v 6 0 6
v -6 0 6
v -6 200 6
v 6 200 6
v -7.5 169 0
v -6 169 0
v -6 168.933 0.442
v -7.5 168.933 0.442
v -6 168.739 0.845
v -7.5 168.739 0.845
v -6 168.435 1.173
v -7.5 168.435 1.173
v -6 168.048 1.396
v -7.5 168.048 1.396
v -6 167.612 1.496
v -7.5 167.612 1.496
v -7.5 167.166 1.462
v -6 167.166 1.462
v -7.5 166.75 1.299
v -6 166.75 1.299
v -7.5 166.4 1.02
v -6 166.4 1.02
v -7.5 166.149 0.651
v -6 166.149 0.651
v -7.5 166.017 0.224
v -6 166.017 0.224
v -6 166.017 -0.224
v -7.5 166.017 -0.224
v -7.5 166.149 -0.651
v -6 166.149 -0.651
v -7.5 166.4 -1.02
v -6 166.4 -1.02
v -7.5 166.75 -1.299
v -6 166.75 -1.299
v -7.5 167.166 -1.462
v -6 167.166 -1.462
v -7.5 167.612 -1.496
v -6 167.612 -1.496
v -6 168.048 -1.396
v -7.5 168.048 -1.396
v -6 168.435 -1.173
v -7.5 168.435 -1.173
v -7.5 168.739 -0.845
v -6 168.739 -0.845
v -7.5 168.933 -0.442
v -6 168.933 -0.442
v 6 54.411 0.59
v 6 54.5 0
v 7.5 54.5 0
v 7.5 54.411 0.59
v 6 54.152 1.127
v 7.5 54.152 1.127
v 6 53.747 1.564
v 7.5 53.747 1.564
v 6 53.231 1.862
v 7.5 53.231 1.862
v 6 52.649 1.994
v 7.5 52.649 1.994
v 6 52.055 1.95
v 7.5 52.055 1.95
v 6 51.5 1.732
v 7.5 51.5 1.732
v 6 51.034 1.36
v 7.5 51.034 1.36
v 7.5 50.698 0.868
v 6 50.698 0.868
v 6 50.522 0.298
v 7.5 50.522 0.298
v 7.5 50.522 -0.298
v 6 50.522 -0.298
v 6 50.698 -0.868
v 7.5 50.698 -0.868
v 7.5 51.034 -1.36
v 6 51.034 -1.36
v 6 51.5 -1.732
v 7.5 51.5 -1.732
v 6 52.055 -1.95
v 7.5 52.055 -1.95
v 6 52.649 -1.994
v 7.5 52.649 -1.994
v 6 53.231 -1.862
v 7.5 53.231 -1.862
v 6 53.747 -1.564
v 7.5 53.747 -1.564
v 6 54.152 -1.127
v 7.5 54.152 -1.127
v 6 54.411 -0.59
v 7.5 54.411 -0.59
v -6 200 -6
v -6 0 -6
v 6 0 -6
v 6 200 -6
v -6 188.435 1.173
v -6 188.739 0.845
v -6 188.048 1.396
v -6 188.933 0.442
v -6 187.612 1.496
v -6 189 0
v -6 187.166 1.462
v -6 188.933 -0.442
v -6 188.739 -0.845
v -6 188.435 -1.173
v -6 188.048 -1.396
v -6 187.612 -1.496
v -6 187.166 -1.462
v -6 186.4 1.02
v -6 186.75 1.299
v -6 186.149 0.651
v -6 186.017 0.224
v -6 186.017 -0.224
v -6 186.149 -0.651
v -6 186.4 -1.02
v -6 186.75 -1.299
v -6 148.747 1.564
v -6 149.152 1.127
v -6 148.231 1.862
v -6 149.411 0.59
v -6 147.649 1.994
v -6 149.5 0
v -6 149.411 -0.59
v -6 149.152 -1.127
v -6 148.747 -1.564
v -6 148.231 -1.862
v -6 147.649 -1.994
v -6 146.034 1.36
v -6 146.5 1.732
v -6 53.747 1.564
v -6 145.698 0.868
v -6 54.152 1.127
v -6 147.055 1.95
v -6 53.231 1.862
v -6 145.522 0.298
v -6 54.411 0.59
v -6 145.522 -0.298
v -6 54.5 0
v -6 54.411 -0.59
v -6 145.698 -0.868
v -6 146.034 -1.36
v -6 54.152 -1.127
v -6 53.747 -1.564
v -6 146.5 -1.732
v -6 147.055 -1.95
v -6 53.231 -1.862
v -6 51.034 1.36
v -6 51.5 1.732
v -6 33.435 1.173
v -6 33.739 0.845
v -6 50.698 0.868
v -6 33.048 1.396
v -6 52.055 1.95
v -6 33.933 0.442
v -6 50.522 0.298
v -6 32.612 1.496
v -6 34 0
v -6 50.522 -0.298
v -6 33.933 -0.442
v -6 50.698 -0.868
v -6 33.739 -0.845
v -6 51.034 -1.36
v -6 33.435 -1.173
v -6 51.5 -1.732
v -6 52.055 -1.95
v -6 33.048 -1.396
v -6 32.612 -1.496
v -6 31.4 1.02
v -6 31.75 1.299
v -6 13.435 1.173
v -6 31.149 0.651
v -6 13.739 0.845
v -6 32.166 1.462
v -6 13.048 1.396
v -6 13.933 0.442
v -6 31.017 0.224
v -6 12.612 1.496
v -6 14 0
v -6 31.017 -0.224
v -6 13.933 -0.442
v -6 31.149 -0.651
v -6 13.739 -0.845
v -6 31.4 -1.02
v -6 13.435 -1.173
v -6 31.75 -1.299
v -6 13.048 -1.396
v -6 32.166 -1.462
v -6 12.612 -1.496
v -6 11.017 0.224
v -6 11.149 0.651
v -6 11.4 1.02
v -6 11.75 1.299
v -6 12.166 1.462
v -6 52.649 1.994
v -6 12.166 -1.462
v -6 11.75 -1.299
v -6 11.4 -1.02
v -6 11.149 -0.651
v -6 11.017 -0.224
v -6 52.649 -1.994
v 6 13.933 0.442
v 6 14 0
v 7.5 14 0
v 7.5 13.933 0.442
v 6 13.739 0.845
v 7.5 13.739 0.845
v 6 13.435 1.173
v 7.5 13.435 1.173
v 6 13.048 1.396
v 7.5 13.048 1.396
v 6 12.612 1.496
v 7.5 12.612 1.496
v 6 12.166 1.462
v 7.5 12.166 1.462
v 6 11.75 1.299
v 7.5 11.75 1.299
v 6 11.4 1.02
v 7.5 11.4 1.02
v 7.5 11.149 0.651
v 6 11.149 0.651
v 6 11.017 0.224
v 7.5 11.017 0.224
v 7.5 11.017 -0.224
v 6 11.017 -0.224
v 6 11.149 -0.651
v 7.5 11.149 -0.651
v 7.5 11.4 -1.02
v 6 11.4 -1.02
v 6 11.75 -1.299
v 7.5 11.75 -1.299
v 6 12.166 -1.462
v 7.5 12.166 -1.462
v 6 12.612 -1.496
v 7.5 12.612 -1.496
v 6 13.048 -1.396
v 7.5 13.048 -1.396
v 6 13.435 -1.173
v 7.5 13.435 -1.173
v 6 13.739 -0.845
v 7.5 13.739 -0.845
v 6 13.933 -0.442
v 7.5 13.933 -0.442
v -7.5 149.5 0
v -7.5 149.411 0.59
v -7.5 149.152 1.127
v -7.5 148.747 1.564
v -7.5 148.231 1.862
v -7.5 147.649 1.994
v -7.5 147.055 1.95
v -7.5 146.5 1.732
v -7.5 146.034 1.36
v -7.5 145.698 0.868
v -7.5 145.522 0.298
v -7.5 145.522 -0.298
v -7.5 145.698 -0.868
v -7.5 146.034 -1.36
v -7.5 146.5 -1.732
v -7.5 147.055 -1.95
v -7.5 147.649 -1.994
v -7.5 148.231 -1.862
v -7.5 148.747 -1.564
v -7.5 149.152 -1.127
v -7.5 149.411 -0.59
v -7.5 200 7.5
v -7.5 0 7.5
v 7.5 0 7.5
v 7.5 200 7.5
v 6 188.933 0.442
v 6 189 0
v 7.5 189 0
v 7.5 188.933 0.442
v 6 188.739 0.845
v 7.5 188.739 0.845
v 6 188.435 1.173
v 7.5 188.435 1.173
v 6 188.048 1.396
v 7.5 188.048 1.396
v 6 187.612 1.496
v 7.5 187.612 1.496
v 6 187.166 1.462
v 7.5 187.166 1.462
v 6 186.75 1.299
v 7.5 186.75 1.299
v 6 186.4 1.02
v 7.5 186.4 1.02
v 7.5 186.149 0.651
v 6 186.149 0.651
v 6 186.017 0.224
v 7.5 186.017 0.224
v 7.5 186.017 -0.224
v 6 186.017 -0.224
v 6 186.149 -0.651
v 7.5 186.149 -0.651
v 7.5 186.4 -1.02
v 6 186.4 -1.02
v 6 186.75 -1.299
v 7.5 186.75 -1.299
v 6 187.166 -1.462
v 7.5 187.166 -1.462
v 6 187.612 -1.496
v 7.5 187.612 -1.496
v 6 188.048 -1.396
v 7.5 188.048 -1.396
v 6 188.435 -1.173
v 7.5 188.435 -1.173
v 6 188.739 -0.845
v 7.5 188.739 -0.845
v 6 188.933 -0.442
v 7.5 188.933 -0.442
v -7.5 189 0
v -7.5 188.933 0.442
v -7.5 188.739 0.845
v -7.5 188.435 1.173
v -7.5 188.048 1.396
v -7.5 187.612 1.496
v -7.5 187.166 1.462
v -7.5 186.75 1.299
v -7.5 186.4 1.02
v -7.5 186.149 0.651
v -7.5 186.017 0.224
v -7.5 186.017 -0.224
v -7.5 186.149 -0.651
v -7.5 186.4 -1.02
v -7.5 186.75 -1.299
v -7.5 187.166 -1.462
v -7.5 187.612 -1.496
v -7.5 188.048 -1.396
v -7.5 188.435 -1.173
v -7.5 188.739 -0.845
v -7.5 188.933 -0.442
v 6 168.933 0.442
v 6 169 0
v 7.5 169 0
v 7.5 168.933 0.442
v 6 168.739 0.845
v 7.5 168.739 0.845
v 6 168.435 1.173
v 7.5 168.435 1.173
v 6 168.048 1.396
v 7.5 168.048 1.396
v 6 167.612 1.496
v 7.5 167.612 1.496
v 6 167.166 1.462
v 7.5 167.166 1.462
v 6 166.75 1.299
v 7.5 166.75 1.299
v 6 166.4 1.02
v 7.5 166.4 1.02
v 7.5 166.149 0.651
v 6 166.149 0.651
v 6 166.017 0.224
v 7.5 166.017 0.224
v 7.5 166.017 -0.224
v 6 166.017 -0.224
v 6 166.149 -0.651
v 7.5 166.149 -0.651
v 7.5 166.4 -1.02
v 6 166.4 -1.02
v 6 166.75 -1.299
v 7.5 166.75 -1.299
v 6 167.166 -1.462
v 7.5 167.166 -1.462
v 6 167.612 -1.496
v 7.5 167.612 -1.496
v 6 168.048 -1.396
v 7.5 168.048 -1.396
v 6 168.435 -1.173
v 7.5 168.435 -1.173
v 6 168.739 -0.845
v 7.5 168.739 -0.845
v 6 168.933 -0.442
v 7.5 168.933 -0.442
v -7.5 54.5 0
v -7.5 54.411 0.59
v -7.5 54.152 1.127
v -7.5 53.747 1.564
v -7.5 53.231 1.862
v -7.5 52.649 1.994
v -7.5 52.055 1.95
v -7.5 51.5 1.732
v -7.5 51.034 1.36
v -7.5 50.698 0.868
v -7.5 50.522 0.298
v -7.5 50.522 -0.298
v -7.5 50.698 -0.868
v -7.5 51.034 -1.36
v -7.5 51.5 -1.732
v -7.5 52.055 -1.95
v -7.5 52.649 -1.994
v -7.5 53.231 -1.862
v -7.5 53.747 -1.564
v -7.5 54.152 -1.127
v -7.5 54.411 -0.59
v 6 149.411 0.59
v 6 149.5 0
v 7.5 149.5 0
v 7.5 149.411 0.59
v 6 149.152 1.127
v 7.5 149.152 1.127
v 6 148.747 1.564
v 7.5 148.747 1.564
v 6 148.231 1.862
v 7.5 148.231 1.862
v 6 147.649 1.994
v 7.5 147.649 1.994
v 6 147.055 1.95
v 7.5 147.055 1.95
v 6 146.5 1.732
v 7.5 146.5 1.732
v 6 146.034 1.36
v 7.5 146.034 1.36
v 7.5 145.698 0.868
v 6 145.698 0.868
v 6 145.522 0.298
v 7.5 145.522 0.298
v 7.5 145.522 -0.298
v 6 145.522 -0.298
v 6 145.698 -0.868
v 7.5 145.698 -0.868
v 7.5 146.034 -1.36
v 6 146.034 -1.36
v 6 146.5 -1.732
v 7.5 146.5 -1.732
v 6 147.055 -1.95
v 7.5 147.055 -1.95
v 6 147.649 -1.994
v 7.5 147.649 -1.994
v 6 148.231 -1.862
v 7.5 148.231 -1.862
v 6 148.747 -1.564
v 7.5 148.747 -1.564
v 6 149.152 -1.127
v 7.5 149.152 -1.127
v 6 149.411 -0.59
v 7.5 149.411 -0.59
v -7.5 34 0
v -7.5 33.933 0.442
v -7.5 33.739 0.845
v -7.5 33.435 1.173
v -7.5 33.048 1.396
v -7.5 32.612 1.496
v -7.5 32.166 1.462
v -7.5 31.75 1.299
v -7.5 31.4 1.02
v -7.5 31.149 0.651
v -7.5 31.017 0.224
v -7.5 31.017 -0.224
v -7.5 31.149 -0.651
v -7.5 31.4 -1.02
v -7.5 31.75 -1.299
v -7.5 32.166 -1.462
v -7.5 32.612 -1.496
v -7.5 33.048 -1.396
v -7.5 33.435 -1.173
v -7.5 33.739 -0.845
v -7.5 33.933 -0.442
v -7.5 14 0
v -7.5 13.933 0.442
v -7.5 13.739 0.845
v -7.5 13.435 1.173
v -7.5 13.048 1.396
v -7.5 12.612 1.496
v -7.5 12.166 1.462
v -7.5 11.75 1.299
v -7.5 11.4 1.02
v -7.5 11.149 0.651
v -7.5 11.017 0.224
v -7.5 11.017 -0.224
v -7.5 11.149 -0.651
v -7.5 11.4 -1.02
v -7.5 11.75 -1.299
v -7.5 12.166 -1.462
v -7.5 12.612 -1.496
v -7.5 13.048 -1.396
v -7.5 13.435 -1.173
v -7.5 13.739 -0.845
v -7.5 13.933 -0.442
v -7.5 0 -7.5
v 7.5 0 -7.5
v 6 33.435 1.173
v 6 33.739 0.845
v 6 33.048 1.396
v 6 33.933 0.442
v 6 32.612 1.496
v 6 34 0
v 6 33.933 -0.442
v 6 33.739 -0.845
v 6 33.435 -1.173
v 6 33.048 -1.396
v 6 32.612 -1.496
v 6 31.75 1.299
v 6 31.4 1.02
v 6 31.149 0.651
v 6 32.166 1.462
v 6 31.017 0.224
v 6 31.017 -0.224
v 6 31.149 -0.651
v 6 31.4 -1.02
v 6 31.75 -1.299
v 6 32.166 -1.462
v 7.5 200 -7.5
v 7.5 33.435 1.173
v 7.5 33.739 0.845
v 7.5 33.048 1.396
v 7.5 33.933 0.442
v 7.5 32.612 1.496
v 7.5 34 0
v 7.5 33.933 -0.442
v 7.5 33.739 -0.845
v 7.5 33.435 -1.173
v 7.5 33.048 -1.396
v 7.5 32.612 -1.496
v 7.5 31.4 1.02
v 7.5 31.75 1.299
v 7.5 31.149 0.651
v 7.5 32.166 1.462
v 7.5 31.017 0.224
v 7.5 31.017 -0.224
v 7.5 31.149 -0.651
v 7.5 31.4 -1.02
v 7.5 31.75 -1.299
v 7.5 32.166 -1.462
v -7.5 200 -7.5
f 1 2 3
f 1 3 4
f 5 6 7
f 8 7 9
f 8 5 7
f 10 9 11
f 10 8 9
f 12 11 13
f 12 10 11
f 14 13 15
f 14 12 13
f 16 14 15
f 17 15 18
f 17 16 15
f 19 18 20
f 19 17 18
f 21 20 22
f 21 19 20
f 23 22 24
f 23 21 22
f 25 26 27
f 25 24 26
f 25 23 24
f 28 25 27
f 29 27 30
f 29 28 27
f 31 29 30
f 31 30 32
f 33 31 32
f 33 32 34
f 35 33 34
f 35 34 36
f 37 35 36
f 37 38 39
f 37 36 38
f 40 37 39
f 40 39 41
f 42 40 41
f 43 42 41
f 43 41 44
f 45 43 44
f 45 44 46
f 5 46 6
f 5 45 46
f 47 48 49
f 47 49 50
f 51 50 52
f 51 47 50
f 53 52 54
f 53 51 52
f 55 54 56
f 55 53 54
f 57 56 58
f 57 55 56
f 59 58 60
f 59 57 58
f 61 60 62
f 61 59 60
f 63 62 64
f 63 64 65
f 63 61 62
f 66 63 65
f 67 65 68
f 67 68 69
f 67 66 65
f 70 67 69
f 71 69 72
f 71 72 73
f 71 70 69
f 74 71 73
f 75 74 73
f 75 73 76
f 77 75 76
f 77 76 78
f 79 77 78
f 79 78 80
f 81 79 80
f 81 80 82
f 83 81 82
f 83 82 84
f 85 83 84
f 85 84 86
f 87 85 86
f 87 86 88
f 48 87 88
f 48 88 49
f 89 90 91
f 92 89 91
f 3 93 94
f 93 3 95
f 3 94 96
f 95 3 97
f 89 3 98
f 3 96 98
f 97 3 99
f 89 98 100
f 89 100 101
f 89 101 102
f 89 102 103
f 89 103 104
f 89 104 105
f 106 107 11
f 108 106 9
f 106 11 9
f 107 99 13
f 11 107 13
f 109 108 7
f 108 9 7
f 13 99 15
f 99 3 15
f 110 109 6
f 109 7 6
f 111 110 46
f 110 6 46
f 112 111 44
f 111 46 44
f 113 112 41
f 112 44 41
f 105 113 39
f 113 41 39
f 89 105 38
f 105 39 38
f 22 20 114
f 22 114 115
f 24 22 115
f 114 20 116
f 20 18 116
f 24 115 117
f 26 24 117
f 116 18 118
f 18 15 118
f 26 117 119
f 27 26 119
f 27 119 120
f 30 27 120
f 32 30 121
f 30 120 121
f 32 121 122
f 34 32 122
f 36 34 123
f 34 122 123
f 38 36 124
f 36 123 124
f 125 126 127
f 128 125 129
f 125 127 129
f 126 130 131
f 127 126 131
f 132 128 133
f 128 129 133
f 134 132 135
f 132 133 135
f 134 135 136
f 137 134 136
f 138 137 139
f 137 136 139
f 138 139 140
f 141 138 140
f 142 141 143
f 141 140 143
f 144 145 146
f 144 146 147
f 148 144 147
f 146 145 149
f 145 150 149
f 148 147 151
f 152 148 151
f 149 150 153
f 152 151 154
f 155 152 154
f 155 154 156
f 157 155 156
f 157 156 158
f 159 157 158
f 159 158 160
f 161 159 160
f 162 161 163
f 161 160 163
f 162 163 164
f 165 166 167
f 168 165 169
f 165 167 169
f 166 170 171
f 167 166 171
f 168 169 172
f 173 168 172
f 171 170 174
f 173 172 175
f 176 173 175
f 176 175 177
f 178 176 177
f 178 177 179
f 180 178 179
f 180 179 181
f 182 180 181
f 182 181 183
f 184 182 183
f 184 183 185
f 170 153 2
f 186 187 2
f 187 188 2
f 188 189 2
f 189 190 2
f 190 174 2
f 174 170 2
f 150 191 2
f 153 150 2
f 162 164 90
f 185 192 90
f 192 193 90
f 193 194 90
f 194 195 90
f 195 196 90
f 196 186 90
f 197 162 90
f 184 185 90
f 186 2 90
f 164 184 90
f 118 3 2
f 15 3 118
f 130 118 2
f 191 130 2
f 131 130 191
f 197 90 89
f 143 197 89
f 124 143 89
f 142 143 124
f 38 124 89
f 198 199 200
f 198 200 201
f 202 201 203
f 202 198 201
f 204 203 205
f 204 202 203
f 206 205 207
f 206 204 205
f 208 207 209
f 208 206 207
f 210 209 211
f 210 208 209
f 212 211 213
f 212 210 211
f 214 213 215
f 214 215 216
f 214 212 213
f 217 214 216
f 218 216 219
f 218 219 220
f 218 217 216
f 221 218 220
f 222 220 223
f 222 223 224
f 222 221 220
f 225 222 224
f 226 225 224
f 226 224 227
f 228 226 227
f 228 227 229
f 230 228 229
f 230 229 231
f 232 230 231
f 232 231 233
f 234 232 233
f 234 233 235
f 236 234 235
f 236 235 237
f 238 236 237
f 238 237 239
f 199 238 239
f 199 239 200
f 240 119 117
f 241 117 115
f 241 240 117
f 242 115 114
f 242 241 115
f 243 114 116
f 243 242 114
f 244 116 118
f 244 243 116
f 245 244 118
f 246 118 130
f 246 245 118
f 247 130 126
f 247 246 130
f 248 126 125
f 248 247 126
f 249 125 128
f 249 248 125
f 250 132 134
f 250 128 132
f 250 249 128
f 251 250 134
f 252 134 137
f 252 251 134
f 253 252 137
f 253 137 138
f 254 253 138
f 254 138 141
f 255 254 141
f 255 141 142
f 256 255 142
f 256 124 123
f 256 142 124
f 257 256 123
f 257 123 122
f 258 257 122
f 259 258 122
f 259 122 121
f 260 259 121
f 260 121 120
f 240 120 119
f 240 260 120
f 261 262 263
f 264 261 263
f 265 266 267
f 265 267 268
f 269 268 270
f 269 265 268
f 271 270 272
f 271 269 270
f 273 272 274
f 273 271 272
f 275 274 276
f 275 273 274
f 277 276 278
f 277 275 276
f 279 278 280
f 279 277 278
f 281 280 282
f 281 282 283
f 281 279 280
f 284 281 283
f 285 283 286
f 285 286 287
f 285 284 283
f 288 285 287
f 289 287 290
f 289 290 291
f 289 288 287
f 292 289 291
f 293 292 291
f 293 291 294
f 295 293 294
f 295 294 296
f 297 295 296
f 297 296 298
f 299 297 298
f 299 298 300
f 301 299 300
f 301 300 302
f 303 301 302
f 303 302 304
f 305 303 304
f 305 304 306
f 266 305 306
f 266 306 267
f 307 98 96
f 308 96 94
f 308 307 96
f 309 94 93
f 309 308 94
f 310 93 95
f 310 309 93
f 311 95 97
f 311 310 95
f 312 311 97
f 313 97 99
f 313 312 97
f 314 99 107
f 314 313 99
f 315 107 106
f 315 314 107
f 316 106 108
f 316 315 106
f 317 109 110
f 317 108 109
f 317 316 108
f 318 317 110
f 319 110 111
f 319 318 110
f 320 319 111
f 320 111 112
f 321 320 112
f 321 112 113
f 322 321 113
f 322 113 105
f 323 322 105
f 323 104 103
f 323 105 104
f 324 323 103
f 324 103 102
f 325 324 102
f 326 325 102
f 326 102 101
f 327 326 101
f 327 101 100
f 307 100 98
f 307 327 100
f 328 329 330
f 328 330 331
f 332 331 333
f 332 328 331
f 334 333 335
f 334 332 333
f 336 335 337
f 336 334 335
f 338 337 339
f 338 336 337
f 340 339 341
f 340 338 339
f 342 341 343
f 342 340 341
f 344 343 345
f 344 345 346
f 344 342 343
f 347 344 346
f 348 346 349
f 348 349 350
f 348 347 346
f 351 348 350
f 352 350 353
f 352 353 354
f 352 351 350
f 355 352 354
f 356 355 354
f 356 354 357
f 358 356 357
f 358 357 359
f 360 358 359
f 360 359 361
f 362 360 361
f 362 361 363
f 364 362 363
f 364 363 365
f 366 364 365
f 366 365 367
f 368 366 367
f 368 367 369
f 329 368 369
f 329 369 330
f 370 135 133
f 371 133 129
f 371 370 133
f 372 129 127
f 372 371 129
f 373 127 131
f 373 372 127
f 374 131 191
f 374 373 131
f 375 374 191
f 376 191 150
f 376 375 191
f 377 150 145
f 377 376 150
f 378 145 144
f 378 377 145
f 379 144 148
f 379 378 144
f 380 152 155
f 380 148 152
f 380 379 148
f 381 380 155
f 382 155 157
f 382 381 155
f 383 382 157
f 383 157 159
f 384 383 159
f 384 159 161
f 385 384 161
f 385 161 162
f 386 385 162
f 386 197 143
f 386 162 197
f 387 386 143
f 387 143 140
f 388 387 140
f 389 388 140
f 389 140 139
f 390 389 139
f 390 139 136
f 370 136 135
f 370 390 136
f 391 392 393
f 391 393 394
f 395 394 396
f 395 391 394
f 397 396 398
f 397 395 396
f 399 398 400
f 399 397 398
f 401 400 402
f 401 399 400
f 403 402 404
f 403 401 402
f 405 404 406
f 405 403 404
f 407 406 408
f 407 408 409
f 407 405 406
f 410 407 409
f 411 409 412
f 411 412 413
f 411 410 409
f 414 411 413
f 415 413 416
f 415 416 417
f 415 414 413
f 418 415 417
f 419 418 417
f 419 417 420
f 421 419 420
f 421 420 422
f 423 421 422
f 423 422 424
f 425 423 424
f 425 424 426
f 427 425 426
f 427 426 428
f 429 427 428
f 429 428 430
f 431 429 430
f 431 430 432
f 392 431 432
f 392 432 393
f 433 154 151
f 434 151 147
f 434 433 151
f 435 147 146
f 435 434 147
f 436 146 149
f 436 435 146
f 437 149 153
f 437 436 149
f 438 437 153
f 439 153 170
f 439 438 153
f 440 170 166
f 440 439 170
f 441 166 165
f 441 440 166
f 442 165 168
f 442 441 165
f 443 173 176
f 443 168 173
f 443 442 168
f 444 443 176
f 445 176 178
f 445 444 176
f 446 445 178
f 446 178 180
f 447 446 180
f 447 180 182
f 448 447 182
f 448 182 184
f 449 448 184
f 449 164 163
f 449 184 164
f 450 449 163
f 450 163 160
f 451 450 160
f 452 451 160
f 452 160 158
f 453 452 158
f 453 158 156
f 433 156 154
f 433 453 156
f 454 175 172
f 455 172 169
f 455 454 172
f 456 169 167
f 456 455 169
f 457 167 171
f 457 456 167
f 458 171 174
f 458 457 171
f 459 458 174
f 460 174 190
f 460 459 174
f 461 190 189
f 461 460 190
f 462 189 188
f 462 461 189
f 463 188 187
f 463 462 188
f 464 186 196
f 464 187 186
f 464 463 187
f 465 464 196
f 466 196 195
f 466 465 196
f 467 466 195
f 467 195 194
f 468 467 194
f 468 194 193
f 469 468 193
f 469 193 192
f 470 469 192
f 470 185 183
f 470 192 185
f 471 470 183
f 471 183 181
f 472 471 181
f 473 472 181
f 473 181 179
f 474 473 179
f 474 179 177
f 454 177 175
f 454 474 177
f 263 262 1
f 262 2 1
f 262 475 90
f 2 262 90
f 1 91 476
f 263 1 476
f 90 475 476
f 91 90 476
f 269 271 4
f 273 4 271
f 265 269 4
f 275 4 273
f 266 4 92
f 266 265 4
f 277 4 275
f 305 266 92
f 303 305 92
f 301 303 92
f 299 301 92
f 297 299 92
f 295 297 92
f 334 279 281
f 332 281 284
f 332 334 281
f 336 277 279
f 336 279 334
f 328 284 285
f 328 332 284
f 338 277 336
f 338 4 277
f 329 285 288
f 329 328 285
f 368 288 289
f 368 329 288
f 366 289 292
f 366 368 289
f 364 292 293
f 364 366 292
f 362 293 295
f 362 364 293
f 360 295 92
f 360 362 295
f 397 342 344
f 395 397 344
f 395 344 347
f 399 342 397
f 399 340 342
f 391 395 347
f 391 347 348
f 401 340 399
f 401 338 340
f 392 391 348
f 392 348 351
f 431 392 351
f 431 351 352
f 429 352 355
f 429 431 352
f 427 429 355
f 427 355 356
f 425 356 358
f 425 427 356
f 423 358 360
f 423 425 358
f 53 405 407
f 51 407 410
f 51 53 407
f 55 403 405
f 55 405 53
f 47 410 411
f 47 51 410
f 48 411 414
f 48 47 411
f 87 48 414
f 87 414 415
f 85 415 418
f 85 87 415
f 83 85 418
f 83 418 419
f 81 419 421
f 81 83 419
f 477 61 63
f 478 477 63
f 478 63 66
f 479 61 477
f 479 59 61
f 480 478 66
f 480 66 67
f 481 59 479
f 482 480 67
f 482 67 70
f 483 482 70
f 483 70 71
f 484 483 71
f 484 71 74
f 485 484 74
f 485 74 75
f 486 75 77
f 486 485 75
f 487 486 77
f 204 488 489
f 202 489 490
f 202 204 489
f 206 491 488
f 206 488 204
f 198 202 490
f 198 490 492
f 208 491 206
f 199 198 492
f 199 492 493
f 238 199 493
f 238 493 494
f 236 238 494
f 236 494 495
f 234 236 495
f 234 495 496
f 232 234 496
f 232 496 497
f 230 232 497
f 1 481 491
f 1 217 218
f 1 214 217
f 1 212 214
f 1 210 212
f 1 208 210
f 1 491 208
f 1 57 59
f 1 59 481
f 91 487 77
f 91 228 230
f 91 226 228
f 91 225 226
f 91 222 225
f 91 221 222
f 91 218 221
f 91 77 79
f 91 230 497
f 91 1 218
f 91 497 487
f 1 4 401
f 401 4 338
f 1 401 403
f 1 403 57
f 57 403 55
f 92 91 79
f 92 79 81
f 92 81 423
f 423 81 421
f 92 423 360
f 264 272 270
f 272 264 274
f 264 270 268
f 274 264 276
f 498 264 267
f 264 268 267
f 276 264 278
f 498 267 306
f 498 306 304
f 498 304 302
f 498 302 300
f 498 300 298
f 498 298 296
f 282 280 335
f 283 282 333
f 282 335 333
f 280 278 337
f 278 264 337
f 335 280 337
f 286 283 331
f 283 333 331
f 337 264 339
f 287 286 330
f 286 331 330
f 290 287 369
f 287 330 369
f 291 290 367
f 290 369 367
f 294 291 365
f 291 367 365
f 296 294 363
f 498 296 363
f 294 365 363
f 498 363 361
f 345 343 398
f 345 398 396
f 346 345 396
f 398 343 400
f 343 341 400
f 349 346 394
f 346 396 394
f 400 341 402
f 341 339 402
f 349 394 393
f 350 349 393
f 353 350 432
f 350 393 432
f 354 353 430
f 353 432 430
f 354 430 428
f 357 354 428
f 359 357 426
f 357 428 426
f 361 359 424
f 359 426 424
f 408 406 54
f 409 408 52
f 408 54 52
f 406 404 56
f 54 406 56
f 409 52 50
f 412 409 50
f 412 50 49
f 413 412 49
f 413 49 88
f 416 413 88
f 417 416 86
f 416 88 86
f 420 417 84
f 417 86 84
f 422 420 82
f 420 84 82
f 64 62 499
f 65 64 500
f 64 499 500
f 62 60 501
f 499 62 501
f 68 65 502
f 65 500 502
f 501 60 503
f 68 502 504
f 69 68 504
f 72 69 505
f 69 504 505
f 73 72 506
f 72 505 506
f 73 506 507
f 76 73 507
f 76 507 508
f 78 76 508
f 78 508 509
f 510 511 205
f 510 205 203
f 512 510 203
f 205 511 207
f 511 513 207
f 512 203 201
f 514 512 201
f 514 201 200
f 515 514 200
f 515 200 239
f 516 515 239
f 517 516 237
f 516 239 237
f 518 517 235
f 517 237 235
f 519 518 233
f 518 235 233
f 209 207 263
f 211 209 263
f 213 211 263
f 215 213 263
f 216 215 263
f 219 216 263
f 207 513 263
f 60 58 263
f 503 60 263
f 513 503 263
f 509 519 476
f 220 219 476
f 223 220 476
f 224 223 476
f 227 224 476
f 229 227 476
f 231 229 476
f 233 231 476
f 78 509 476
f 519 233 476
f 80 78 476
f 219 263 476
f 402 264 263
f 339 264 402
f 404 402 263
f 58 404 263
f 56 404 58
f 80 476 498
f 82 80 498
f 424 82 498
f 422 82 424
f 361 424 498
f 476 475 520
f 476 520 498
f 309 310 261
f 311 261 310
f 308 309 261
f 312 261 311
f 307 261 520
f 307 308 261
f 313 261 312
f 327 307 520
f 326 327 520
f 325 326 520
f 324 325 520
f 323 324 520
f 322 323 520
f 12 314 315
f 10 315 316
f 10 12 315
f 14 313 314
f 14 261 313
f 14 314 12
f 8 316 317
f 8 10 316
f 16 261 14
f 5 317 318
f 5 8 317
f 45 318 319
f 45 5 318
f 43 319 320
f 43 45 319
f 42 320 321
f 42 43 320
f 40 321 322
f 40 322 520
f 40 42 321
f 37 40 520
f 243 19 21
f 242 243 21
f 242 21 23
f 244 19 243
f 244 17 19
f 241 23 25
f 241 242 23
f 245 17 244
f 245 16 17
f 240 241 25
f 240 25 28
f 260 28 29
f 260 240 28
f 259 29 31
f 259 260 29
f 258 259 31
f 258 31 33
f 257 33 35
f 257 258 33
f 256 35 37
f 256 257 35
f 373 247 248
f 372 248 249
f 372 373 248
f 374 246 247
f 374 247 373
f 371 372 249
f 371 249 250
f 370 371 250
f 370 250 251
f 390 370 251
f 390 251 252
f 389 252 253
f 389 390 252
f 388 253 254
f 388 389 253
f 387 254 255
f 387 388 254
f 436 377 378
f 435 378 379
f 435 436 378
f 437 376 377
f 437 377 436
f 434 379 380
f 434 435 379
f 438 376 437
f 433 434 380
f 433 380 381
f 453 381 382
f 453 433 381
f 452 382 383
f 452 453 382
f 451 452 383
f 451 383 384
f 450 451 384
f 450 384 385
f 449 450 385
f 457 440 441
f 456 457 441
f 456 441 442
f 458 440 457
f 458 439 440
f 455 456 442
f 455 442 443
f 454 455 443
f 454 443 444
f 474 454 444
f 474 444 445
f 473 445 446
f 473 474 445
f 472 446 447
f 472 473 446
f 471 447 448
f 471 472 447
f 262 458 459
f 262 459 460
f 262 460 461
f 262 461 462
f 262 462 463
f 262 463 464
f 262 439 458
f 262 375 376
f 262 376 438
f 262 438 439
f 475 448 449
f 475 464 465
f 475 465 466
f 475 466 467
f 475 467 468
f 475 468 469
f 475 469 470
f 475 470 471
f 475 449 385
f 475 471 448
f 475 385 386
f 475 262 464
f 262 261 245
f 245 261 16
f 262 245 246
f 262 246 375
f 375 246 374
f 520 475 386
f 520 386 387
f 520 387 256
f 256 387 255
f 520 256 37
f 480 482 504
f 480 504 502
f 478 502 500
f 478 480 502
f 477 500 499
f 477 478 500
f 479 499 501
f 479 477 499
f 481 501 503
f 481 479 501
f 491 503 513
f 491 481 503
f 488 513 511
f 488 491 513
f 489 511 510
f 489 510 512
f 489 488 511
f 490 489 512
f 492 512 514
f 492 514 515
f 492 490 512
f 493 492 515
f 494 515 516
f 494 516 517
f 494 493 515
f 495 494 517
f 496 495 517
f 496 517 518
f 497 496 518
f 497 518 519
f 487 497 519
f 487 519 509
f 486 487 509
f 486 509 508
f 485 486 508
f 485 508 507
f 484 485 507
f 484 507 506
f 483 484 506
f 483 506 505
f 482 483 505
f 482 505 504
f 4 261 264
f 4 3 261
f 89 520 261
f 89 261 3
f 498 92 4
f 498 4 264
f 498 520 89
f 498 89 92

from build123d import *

# Parameters (mm, degrees)
SKETCH_1_W                = 15
SKETCH_1_H                = 15
SKETCH_1_W_2              = 12
SKETCH_1_H_2              = 12
EXTRUDE_1_DEPTH           = 200
CUT_EXTRUDE_START         = -7.5
CUT_EXTRUDE_1_OUTLINE_R   = 1.5
CUT_EXTRUDE_1_OUTLINE_R_2 = 2
CUT_EXTRUDE_1_DEPTH       = 15


# Read off the part's stored shape, not the designer's step: 切除-拉伸1
with BuildPart() as part:
    # 草图1 → 凸台-拉伸1 (new body)
    with BuildSketch(Plane(origin=(0, 0, 0), x_dir=(1, 0, 0), z_dir=(0, 1, 0))):
        Rectangle(SKETCH_1_W, SKETCH_1_H)
        Rectangle(SKETCH_1_W_2, SKETCH_1_H_2, mode=Mode.SUBTRACT)
    extrude(amount=EXTRUDE_1_DEPTH)

    # 切除-拉伸1 outline → 切除-拉伸1 (cut)
    with BuildSketch(Plane.YZ.offset(CUT_EXTRUDE_START)):
        with Locations((12.5, 0)):
            Circle(CUT_EXTRUDE_1_OUTLINE_R)
        with Locations((32.5, 0)):
            Circle(CUT_EXTRUDE_1_OUTLINE_R)
        with Locations((52.5, 0)):
            Circle(CUT_EXTRUDE_1_OUTLINE_R_2)
        with Locations((147.5, 0)):
            Circle(CUT_EXTRUDE_1_OUTLINE_R_2)
        with Locations((167.5, 0)):
            Circle(CUT_EXTRUDE_1_OUTLINE_R)
        with Locations((187.5, 0)):
            Circle(CUT_EXTRUDE_1_OUTLINE_R)
    extrude(amount=CUT_EXTRUDE_1_DEPTH, mode=Mode.SUBTRACT)


solid = part.part
